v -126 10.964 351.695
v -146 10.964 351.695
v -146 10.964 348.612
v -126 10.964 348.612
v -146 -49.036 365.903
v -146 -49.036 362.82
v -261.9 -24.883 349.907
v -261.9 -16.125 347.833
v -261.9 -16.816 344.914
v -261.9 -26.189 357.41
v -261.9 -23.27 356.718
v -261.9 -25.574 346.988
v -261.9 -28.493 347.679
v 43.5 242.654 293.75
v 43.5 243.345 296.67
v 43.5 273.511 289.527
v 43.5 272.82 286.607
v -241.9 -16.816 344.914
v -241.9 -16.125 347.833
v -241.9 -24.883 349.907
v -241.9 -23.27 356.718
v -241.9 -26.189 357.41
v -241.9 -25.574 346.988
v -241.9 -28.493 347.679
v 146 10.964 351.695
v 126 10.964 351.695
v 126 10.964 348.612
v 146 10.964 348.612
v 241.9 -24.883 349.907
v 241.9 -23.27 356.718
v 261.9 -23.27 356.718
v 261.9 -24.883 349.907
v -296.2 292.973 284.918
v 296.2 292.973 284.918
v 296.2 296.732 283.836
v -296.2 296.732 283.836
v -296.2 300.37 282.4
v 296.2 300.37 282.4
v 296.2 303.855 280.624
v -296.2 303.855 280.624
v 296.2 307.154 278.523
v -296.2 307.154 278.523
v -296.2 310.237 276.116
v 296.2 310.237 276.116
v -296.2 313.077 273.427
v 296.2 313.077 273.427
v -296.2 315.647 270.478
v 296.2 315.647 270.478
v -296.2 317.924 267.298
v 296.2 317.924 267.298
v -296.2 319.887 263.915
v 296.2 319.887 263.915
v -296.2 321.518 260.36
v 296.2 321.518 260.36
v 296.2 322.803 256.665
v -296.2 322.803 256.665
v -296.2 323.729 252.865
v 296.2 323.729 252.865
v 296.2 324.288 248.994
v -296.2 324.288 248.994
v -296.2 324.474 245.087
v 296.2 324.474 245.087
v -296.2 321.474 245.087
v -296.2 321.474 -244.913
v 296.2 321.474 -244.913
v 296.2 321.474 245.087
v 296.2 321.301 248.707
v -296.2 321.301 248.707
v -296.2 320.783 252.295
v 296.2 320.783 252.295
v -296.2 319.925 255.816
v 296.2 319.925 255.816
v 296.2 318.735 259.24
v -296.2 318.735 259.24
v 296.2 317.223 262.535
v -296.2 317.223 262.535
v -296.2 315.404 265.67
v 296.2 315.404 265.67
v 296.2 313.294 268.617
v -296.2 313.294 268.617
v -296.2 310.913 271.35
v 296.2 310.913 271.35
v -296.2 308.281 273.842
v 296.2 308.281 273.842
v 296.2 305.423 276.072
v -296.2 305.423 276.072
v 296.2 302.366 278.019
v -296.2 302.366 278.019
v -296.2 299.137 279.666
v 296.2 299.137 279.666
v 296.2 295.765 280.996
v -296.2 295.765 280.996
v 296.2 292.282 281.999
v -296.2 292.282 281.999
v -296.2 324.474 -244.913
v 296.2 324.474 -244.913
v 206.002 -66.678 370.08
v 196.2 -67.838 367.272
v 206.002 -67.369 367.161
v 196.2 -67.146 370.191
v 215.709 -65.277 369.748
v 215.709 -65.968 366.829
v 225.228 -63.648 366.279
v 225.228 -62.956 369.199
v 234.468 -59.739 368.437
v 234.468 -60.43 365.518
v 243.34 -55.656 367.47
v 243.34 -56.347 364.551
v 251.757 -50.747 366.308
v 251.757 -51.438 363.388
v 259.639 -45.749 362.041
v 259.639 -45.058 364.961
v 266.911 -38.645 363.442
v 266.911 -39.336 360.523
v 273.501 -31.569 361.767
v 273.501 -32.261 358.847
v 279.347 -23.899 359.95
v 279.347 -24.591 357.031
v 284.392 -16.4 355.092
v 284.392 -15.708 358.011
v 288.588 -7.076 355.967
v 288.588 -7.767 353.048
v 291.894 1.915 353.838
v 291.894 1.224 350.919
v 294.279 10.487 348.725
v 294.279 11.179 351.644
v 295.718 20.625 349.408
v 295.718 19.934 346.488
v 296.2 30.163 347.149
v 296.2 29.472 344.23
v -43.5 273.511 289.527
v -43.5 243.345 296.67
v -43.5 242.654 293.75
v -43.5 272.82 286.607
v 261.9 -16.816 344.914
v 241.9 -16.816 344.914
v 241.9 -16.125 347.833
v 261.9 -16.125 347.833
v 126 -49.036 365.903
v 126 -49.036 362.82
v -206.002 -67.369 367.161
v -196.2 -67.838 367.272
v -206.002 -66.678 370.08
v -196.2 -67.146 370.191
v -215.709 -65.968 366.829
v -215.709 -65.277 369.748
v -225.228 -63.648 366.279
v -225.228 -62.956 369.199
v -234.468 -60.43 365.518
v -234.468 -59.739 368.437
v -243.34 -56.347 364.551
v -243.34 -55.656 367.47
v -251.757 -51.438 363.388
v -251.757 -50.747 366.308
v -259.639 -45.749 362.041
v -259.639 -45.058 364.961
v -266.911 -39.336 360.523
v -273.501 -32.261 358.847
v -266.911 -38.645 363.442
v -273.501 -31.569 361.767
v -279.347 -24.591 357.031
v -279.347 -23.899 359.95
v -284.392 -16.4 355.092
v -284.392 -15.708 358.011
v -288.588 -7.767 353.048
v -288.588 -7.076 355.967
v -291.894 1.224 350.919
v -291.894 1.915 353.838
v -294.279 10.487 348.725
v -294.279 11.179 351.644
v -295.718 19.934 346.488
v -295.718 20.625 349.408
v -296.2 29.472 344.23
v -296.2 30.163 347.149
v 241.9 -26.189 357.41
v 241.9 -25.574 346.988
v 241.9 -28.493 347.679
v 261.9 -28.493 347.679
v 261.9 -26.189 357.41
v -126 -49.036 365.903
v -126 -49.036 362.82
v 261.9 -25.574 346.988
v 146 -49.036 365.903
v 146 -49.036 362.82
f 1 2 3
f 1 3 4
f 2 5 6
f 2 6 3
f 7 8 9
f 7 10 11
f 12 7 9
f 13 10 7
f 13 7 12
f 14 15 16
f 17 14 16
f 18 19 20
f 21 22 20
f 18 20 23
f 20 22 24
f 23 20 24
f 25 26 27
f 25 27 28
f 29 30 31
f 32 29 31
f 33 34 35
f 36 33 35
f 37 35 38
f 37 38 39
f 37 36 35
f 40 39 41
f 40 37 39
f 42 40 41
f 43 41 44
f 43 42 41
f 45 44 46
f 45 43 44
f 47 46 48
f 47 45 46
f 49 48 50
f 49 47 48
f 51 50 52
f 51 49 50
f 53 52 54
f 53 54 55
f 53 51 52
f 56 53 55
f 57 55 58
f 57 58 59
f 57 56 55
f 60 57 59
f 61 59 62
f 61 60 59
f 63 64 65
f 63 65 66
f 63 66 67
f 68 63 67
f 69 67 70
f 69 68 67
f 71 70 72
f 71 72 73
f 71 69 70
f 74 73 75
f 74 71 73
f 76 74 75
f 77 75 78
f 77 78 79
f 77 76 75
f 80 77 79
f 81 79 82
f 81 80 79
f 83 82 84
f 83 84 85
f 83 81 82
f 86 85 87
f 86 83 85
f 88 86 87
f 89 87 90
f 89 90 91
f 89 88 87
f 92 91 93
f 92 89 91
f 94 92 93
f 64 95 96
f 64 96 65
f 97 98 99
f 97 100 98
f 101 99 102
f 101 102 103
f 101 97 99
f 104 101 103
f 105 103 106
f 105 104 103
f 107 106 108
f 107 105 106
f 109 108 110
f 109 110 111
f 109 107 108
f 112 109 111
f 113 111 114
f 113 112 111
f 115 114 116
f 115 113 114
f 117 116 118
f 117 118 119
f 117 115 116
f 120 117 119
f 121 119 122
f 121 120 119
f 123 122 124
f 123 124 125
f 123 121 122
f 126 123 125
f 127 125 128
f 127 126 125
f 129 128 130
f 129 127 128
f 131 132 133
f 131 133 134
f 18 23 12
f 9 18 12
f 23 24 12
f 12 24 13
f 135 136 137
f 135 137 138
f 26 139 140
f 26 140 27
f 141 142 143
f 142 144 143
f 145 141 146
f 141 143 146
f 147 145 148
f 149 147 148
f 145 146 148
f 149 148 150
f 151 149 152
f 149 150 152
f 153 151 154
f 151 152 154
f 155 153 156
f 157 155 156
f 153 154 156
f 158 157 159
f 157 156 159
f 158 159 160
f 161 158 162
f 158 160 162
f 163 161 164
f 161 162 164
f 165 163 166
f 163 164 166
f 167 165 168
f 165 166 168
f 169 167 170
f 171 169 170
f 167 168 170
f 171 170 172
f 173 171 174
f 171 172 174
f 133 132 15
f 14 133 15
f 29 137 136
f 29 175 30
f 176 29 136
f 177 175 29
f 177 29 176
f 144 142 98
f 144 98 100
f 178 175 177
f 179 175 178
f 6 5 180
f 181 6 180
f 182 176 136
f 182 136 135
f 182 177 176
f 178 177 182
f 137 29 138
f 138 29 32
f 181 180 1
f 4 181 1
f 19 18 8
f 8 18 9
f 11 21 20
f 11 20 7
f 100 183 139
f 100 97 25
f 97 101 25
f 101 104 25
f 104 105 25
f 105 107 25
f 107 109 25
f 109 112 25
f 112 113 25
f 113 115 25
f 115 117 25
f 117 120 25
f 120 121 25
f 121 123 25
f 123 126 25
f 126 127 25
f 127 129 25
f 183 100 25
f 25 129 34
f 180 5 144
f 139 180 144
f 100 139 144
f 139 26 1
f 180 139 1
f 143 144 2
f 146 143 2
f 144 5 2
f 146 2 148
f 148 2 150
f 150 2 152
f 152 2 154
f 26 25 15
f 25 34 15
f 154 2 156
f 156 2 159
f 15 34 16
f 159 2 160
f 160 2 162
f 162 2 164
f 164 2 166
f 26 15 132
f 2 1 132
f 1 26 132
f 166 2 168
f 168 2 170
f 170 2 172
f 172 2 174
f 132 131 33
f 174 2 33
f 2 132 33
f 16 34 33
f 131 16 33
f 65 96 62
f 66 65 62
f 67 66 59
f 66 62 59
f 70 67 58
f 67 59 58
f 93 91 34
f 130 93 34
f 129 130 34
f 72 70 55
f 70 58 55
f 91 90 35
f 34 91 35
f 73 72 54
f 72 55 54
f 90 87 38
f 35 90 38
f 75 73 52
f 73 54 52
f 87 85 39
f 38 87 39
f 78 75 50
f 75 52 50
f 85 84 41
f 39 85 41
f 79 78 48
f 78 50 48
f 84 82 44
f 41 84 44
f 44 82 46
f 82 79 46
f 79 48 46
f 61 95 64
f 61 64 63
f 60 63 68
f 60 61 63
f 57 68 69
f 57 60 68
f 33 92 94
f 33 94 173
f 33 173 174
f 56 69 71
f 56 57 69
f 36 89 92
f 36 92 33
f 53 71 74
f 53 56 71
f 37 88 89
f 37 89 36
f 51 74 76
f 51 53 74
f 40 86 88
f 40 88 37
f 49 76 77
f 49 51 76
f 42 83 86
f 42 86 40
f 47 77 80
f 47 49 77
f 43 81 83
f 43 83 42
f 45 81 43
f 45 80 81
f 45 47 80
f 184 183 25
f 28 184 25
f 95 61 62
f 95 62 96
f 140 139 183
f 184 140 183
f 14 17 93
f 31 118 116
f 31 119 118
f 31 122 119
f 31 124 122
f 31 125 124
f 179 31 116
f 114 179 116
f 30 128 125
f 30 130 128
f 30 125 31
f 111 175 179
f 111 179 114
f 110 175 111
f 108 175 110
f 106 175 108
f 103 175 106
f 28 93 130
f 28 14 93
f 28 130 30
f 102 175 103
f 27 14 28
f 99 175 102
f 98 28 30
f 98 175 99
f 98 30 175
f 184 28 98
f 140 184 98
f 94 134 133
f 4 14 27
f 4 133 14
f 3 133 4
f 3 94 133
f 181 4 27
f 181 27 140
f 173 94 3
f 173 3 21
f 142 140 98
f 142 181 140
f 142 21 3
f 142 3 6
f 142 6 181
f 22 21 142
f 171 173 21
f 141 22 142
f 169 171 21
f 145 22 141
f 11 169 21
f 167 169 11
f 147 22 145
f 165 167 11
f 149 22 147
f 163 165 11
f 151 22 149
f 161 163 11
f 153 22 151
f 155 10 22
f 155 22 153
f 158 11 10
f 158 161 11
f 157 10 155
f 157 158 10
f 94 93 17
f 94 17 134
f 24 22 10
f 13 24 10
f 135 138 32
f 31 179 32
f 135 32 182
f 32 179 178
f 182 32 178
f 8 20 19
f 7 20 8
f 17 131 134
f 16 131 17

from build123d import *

# Parameters (mm, degrees)
EXTRUDE_1_DEPTH      = 296.2
EXTRUDE_1_DEPTH_BACK = 296.2
CUT_EXTRUDE_1_REACH  = 765.895
SKETCH_3_W           = 20
SKETCH_3_H           = 60
FILLET_1_R           = 100
CUT_EXTRUDE_2_REACH  = 698.157
SKETCH_10_W          = 87
SKETCH_10_H          = 31
SKETCH_11_W          = 20
SKETCH_11_H          = 3
EXTRUDE_2_DEPTH      = 13
SKETCH_12_W          = 20
SKETCH_12_H          = 3
EXTRUDE_3_DEPTH      = 9


with BuildPart() as part:
    # 스케치2 → 보스-돌출1 (new, two sides: drawn at the far end of the back side and taken through both)
    with BuildSketch(Plane(origin=(0, 0, 0), x_dir=(0, 0, -1), z_dir=(1, 0, 0)).offset(-EXTRUDE_1_DEPTH_BACK)):
        with BuildLine():
            Line((-367.271624482, -67.837616249), (-370.190899695, -67.146362149))
            Line((-370.190899695, -67.146362149), (-284.918377839, 292.972961731))
            ThreePointArc((-284.918377839, 292.972961731), (-270.478085605, 315.647309269), (-245.086561619, 324.474459758))
            Line((-245.086561619, 324.474459758), (244.913438381, 324.474459758))
            Line((244.913438381, 324.474459758), (244.913438381, 321.474459758))
            Line((244.913438381, 321.474459758), (-245.086561619, 321.474459758))
            ThreePointArc((-245.086561619, 321.474459758), (-268.617139918, 313.294251439), (-281.999102626, 292.28170763))
            Line((-281.999102626, 292.28170763), (-367.271624482, -67.837616249))
        make_face()
    extrude(amount=EXTRUDE_1_DEPTH + EXTRUDE_1_DEPTH_BACK)

    # 컷-돌출1: up to this plane
    cut_extrude_1_end = Plane(origin=(-296.2, 78.747200123, 332.561859888), z_dir=(0, 0.23041803358111448, 0.9730917376078232))
    # 스케치3 → 컷-돌출1 (cut, up to the surface)
    with BuildSketch(Plane.XY.offset(380), mode=Mode.PRIVATE) as cut_extrude_1_sk1:
        with Locations((-136, -19.036362149)):
            Rectangle(SKETCH_3_W, SKETCH_3_H)
    cut_extrude_1_tool1 = split(extrude(cut_extrude_1_sk1.sketch, amount=-CUT_EXTRUDE_1_REACH, mode=Mode.PRIVATE), bisect_by=cut_extrude_1_end, keep=Keep.BOTH, mode=Mode.PRIVATE)
    add(cut_extrude_1_tool1.solids().sort_by_distance((-136, -19.036362, 380))[0], mode=Mode.SUBTRACT)
    # 스케치3 → 컷-돌출1 (cut, up to the surface)
    with BuildSketch(Plane.XY.offset(380), mode=Mode.PRIVATE) as cut_extrude_1_sk2:
        with Locations((136, -19.036362149)):
            Rectangle(SKETCH_3_W, SKETCH_3_H)
    cut_extrude_1_tool2 = split(extrude(cut_extrude_1_sk2.sketch, amount=-CUT_EXTRUDE_1_REACH, mode=Mode.PRIVATE), bisect_by=cut_extrude_1_end, keep=Keep.BOTH, mode=Mode.PRIVATE)
    add(cut_extrude_1_tool2.solids().sort_by_distance((136, -19.036362, 380))[0], mode=Mode.SUBTRACT)

    # 필렛1
    fillet_1_edges = [part.edges().sort_by_distance(p)[0] for p in [
        (296.2, -67.491989199, 368.731262089),
        (-296.2, -67.491989199, 368.731262089),
    ]]
    fillet(fillet_1_edges, radius=FILLET_1_R)

    # 스케치10 → 컷-돌출2 (cut, up to next)
    with BuildSketch(Plane(origin=(0, 79.438454224, 335.4811351), x_dir=(1, 0, 0), z_dir=(0, 0.23041803358111446, 0.9730917376078232)), mode=Mode.PRIVATE) as cut_extrude_2_sk1:
        with Locations((0, 183.93923605)):
            Rectangle(SKETCH_10_W, SKETCH_10_H)
    cut_extrude_2_tool1 = extrude(cut_extrude_2_sk1.sketch, amount=-CUT_EXTRUDE_2_REACH, mode=Mode.PRIVATE) & part.part
    add(cut_extrude_2_tool1.solids().sort_by_distance((0, 258.428205, 293.098218))[0], mode=Mode.SUBTRACT)

    # 스케치11 → 보스-돌출2 (add)
    with BuildSketch(Plane(origin=(0, 79.438454224, 335.4811351), x_dir=(1, 0, 0), z_dir=(0, 0.23041803358111446, 0.9730917376078232))):
        with Locations((251.9, -106.338229375)):
            Rectangle(SKETCH_11_W, SKETCH_11_H)
    extrude_2 = extrude(amount=-EXTRUDE_2_DEPTH)

    # 스케치12 → 보스-돌출3 (add)
    with BuildSketch(Plane(origin=(0, -102.01721479, 24.156618657), x_dir=(1, 0, 0), z_dir=(0, 0.9730917376078232, -0.23041803358111443))):
        with Locations((251.9, -333.257973102)):
            Rectangle(SKETCH_12_W, SKETCH_12_H)
    extrude_3 = extrude(amount=EXTRUDE_3_DEPTH)

    # 대칭 복사1: 보스-돌출2, 보스-돌출3 across plane
    add(extrude_2.mirror(Plane(origin=(0, 0, 0), x_dir=(0, 0, 1), z_dir=(1, 0, 0))))
    add(extrude_3.mirror(Plane(origin=(0, 0, 0), x_dir=(0, 0, 1), z_dir=(1, 0, 0))))


solid = part.part
